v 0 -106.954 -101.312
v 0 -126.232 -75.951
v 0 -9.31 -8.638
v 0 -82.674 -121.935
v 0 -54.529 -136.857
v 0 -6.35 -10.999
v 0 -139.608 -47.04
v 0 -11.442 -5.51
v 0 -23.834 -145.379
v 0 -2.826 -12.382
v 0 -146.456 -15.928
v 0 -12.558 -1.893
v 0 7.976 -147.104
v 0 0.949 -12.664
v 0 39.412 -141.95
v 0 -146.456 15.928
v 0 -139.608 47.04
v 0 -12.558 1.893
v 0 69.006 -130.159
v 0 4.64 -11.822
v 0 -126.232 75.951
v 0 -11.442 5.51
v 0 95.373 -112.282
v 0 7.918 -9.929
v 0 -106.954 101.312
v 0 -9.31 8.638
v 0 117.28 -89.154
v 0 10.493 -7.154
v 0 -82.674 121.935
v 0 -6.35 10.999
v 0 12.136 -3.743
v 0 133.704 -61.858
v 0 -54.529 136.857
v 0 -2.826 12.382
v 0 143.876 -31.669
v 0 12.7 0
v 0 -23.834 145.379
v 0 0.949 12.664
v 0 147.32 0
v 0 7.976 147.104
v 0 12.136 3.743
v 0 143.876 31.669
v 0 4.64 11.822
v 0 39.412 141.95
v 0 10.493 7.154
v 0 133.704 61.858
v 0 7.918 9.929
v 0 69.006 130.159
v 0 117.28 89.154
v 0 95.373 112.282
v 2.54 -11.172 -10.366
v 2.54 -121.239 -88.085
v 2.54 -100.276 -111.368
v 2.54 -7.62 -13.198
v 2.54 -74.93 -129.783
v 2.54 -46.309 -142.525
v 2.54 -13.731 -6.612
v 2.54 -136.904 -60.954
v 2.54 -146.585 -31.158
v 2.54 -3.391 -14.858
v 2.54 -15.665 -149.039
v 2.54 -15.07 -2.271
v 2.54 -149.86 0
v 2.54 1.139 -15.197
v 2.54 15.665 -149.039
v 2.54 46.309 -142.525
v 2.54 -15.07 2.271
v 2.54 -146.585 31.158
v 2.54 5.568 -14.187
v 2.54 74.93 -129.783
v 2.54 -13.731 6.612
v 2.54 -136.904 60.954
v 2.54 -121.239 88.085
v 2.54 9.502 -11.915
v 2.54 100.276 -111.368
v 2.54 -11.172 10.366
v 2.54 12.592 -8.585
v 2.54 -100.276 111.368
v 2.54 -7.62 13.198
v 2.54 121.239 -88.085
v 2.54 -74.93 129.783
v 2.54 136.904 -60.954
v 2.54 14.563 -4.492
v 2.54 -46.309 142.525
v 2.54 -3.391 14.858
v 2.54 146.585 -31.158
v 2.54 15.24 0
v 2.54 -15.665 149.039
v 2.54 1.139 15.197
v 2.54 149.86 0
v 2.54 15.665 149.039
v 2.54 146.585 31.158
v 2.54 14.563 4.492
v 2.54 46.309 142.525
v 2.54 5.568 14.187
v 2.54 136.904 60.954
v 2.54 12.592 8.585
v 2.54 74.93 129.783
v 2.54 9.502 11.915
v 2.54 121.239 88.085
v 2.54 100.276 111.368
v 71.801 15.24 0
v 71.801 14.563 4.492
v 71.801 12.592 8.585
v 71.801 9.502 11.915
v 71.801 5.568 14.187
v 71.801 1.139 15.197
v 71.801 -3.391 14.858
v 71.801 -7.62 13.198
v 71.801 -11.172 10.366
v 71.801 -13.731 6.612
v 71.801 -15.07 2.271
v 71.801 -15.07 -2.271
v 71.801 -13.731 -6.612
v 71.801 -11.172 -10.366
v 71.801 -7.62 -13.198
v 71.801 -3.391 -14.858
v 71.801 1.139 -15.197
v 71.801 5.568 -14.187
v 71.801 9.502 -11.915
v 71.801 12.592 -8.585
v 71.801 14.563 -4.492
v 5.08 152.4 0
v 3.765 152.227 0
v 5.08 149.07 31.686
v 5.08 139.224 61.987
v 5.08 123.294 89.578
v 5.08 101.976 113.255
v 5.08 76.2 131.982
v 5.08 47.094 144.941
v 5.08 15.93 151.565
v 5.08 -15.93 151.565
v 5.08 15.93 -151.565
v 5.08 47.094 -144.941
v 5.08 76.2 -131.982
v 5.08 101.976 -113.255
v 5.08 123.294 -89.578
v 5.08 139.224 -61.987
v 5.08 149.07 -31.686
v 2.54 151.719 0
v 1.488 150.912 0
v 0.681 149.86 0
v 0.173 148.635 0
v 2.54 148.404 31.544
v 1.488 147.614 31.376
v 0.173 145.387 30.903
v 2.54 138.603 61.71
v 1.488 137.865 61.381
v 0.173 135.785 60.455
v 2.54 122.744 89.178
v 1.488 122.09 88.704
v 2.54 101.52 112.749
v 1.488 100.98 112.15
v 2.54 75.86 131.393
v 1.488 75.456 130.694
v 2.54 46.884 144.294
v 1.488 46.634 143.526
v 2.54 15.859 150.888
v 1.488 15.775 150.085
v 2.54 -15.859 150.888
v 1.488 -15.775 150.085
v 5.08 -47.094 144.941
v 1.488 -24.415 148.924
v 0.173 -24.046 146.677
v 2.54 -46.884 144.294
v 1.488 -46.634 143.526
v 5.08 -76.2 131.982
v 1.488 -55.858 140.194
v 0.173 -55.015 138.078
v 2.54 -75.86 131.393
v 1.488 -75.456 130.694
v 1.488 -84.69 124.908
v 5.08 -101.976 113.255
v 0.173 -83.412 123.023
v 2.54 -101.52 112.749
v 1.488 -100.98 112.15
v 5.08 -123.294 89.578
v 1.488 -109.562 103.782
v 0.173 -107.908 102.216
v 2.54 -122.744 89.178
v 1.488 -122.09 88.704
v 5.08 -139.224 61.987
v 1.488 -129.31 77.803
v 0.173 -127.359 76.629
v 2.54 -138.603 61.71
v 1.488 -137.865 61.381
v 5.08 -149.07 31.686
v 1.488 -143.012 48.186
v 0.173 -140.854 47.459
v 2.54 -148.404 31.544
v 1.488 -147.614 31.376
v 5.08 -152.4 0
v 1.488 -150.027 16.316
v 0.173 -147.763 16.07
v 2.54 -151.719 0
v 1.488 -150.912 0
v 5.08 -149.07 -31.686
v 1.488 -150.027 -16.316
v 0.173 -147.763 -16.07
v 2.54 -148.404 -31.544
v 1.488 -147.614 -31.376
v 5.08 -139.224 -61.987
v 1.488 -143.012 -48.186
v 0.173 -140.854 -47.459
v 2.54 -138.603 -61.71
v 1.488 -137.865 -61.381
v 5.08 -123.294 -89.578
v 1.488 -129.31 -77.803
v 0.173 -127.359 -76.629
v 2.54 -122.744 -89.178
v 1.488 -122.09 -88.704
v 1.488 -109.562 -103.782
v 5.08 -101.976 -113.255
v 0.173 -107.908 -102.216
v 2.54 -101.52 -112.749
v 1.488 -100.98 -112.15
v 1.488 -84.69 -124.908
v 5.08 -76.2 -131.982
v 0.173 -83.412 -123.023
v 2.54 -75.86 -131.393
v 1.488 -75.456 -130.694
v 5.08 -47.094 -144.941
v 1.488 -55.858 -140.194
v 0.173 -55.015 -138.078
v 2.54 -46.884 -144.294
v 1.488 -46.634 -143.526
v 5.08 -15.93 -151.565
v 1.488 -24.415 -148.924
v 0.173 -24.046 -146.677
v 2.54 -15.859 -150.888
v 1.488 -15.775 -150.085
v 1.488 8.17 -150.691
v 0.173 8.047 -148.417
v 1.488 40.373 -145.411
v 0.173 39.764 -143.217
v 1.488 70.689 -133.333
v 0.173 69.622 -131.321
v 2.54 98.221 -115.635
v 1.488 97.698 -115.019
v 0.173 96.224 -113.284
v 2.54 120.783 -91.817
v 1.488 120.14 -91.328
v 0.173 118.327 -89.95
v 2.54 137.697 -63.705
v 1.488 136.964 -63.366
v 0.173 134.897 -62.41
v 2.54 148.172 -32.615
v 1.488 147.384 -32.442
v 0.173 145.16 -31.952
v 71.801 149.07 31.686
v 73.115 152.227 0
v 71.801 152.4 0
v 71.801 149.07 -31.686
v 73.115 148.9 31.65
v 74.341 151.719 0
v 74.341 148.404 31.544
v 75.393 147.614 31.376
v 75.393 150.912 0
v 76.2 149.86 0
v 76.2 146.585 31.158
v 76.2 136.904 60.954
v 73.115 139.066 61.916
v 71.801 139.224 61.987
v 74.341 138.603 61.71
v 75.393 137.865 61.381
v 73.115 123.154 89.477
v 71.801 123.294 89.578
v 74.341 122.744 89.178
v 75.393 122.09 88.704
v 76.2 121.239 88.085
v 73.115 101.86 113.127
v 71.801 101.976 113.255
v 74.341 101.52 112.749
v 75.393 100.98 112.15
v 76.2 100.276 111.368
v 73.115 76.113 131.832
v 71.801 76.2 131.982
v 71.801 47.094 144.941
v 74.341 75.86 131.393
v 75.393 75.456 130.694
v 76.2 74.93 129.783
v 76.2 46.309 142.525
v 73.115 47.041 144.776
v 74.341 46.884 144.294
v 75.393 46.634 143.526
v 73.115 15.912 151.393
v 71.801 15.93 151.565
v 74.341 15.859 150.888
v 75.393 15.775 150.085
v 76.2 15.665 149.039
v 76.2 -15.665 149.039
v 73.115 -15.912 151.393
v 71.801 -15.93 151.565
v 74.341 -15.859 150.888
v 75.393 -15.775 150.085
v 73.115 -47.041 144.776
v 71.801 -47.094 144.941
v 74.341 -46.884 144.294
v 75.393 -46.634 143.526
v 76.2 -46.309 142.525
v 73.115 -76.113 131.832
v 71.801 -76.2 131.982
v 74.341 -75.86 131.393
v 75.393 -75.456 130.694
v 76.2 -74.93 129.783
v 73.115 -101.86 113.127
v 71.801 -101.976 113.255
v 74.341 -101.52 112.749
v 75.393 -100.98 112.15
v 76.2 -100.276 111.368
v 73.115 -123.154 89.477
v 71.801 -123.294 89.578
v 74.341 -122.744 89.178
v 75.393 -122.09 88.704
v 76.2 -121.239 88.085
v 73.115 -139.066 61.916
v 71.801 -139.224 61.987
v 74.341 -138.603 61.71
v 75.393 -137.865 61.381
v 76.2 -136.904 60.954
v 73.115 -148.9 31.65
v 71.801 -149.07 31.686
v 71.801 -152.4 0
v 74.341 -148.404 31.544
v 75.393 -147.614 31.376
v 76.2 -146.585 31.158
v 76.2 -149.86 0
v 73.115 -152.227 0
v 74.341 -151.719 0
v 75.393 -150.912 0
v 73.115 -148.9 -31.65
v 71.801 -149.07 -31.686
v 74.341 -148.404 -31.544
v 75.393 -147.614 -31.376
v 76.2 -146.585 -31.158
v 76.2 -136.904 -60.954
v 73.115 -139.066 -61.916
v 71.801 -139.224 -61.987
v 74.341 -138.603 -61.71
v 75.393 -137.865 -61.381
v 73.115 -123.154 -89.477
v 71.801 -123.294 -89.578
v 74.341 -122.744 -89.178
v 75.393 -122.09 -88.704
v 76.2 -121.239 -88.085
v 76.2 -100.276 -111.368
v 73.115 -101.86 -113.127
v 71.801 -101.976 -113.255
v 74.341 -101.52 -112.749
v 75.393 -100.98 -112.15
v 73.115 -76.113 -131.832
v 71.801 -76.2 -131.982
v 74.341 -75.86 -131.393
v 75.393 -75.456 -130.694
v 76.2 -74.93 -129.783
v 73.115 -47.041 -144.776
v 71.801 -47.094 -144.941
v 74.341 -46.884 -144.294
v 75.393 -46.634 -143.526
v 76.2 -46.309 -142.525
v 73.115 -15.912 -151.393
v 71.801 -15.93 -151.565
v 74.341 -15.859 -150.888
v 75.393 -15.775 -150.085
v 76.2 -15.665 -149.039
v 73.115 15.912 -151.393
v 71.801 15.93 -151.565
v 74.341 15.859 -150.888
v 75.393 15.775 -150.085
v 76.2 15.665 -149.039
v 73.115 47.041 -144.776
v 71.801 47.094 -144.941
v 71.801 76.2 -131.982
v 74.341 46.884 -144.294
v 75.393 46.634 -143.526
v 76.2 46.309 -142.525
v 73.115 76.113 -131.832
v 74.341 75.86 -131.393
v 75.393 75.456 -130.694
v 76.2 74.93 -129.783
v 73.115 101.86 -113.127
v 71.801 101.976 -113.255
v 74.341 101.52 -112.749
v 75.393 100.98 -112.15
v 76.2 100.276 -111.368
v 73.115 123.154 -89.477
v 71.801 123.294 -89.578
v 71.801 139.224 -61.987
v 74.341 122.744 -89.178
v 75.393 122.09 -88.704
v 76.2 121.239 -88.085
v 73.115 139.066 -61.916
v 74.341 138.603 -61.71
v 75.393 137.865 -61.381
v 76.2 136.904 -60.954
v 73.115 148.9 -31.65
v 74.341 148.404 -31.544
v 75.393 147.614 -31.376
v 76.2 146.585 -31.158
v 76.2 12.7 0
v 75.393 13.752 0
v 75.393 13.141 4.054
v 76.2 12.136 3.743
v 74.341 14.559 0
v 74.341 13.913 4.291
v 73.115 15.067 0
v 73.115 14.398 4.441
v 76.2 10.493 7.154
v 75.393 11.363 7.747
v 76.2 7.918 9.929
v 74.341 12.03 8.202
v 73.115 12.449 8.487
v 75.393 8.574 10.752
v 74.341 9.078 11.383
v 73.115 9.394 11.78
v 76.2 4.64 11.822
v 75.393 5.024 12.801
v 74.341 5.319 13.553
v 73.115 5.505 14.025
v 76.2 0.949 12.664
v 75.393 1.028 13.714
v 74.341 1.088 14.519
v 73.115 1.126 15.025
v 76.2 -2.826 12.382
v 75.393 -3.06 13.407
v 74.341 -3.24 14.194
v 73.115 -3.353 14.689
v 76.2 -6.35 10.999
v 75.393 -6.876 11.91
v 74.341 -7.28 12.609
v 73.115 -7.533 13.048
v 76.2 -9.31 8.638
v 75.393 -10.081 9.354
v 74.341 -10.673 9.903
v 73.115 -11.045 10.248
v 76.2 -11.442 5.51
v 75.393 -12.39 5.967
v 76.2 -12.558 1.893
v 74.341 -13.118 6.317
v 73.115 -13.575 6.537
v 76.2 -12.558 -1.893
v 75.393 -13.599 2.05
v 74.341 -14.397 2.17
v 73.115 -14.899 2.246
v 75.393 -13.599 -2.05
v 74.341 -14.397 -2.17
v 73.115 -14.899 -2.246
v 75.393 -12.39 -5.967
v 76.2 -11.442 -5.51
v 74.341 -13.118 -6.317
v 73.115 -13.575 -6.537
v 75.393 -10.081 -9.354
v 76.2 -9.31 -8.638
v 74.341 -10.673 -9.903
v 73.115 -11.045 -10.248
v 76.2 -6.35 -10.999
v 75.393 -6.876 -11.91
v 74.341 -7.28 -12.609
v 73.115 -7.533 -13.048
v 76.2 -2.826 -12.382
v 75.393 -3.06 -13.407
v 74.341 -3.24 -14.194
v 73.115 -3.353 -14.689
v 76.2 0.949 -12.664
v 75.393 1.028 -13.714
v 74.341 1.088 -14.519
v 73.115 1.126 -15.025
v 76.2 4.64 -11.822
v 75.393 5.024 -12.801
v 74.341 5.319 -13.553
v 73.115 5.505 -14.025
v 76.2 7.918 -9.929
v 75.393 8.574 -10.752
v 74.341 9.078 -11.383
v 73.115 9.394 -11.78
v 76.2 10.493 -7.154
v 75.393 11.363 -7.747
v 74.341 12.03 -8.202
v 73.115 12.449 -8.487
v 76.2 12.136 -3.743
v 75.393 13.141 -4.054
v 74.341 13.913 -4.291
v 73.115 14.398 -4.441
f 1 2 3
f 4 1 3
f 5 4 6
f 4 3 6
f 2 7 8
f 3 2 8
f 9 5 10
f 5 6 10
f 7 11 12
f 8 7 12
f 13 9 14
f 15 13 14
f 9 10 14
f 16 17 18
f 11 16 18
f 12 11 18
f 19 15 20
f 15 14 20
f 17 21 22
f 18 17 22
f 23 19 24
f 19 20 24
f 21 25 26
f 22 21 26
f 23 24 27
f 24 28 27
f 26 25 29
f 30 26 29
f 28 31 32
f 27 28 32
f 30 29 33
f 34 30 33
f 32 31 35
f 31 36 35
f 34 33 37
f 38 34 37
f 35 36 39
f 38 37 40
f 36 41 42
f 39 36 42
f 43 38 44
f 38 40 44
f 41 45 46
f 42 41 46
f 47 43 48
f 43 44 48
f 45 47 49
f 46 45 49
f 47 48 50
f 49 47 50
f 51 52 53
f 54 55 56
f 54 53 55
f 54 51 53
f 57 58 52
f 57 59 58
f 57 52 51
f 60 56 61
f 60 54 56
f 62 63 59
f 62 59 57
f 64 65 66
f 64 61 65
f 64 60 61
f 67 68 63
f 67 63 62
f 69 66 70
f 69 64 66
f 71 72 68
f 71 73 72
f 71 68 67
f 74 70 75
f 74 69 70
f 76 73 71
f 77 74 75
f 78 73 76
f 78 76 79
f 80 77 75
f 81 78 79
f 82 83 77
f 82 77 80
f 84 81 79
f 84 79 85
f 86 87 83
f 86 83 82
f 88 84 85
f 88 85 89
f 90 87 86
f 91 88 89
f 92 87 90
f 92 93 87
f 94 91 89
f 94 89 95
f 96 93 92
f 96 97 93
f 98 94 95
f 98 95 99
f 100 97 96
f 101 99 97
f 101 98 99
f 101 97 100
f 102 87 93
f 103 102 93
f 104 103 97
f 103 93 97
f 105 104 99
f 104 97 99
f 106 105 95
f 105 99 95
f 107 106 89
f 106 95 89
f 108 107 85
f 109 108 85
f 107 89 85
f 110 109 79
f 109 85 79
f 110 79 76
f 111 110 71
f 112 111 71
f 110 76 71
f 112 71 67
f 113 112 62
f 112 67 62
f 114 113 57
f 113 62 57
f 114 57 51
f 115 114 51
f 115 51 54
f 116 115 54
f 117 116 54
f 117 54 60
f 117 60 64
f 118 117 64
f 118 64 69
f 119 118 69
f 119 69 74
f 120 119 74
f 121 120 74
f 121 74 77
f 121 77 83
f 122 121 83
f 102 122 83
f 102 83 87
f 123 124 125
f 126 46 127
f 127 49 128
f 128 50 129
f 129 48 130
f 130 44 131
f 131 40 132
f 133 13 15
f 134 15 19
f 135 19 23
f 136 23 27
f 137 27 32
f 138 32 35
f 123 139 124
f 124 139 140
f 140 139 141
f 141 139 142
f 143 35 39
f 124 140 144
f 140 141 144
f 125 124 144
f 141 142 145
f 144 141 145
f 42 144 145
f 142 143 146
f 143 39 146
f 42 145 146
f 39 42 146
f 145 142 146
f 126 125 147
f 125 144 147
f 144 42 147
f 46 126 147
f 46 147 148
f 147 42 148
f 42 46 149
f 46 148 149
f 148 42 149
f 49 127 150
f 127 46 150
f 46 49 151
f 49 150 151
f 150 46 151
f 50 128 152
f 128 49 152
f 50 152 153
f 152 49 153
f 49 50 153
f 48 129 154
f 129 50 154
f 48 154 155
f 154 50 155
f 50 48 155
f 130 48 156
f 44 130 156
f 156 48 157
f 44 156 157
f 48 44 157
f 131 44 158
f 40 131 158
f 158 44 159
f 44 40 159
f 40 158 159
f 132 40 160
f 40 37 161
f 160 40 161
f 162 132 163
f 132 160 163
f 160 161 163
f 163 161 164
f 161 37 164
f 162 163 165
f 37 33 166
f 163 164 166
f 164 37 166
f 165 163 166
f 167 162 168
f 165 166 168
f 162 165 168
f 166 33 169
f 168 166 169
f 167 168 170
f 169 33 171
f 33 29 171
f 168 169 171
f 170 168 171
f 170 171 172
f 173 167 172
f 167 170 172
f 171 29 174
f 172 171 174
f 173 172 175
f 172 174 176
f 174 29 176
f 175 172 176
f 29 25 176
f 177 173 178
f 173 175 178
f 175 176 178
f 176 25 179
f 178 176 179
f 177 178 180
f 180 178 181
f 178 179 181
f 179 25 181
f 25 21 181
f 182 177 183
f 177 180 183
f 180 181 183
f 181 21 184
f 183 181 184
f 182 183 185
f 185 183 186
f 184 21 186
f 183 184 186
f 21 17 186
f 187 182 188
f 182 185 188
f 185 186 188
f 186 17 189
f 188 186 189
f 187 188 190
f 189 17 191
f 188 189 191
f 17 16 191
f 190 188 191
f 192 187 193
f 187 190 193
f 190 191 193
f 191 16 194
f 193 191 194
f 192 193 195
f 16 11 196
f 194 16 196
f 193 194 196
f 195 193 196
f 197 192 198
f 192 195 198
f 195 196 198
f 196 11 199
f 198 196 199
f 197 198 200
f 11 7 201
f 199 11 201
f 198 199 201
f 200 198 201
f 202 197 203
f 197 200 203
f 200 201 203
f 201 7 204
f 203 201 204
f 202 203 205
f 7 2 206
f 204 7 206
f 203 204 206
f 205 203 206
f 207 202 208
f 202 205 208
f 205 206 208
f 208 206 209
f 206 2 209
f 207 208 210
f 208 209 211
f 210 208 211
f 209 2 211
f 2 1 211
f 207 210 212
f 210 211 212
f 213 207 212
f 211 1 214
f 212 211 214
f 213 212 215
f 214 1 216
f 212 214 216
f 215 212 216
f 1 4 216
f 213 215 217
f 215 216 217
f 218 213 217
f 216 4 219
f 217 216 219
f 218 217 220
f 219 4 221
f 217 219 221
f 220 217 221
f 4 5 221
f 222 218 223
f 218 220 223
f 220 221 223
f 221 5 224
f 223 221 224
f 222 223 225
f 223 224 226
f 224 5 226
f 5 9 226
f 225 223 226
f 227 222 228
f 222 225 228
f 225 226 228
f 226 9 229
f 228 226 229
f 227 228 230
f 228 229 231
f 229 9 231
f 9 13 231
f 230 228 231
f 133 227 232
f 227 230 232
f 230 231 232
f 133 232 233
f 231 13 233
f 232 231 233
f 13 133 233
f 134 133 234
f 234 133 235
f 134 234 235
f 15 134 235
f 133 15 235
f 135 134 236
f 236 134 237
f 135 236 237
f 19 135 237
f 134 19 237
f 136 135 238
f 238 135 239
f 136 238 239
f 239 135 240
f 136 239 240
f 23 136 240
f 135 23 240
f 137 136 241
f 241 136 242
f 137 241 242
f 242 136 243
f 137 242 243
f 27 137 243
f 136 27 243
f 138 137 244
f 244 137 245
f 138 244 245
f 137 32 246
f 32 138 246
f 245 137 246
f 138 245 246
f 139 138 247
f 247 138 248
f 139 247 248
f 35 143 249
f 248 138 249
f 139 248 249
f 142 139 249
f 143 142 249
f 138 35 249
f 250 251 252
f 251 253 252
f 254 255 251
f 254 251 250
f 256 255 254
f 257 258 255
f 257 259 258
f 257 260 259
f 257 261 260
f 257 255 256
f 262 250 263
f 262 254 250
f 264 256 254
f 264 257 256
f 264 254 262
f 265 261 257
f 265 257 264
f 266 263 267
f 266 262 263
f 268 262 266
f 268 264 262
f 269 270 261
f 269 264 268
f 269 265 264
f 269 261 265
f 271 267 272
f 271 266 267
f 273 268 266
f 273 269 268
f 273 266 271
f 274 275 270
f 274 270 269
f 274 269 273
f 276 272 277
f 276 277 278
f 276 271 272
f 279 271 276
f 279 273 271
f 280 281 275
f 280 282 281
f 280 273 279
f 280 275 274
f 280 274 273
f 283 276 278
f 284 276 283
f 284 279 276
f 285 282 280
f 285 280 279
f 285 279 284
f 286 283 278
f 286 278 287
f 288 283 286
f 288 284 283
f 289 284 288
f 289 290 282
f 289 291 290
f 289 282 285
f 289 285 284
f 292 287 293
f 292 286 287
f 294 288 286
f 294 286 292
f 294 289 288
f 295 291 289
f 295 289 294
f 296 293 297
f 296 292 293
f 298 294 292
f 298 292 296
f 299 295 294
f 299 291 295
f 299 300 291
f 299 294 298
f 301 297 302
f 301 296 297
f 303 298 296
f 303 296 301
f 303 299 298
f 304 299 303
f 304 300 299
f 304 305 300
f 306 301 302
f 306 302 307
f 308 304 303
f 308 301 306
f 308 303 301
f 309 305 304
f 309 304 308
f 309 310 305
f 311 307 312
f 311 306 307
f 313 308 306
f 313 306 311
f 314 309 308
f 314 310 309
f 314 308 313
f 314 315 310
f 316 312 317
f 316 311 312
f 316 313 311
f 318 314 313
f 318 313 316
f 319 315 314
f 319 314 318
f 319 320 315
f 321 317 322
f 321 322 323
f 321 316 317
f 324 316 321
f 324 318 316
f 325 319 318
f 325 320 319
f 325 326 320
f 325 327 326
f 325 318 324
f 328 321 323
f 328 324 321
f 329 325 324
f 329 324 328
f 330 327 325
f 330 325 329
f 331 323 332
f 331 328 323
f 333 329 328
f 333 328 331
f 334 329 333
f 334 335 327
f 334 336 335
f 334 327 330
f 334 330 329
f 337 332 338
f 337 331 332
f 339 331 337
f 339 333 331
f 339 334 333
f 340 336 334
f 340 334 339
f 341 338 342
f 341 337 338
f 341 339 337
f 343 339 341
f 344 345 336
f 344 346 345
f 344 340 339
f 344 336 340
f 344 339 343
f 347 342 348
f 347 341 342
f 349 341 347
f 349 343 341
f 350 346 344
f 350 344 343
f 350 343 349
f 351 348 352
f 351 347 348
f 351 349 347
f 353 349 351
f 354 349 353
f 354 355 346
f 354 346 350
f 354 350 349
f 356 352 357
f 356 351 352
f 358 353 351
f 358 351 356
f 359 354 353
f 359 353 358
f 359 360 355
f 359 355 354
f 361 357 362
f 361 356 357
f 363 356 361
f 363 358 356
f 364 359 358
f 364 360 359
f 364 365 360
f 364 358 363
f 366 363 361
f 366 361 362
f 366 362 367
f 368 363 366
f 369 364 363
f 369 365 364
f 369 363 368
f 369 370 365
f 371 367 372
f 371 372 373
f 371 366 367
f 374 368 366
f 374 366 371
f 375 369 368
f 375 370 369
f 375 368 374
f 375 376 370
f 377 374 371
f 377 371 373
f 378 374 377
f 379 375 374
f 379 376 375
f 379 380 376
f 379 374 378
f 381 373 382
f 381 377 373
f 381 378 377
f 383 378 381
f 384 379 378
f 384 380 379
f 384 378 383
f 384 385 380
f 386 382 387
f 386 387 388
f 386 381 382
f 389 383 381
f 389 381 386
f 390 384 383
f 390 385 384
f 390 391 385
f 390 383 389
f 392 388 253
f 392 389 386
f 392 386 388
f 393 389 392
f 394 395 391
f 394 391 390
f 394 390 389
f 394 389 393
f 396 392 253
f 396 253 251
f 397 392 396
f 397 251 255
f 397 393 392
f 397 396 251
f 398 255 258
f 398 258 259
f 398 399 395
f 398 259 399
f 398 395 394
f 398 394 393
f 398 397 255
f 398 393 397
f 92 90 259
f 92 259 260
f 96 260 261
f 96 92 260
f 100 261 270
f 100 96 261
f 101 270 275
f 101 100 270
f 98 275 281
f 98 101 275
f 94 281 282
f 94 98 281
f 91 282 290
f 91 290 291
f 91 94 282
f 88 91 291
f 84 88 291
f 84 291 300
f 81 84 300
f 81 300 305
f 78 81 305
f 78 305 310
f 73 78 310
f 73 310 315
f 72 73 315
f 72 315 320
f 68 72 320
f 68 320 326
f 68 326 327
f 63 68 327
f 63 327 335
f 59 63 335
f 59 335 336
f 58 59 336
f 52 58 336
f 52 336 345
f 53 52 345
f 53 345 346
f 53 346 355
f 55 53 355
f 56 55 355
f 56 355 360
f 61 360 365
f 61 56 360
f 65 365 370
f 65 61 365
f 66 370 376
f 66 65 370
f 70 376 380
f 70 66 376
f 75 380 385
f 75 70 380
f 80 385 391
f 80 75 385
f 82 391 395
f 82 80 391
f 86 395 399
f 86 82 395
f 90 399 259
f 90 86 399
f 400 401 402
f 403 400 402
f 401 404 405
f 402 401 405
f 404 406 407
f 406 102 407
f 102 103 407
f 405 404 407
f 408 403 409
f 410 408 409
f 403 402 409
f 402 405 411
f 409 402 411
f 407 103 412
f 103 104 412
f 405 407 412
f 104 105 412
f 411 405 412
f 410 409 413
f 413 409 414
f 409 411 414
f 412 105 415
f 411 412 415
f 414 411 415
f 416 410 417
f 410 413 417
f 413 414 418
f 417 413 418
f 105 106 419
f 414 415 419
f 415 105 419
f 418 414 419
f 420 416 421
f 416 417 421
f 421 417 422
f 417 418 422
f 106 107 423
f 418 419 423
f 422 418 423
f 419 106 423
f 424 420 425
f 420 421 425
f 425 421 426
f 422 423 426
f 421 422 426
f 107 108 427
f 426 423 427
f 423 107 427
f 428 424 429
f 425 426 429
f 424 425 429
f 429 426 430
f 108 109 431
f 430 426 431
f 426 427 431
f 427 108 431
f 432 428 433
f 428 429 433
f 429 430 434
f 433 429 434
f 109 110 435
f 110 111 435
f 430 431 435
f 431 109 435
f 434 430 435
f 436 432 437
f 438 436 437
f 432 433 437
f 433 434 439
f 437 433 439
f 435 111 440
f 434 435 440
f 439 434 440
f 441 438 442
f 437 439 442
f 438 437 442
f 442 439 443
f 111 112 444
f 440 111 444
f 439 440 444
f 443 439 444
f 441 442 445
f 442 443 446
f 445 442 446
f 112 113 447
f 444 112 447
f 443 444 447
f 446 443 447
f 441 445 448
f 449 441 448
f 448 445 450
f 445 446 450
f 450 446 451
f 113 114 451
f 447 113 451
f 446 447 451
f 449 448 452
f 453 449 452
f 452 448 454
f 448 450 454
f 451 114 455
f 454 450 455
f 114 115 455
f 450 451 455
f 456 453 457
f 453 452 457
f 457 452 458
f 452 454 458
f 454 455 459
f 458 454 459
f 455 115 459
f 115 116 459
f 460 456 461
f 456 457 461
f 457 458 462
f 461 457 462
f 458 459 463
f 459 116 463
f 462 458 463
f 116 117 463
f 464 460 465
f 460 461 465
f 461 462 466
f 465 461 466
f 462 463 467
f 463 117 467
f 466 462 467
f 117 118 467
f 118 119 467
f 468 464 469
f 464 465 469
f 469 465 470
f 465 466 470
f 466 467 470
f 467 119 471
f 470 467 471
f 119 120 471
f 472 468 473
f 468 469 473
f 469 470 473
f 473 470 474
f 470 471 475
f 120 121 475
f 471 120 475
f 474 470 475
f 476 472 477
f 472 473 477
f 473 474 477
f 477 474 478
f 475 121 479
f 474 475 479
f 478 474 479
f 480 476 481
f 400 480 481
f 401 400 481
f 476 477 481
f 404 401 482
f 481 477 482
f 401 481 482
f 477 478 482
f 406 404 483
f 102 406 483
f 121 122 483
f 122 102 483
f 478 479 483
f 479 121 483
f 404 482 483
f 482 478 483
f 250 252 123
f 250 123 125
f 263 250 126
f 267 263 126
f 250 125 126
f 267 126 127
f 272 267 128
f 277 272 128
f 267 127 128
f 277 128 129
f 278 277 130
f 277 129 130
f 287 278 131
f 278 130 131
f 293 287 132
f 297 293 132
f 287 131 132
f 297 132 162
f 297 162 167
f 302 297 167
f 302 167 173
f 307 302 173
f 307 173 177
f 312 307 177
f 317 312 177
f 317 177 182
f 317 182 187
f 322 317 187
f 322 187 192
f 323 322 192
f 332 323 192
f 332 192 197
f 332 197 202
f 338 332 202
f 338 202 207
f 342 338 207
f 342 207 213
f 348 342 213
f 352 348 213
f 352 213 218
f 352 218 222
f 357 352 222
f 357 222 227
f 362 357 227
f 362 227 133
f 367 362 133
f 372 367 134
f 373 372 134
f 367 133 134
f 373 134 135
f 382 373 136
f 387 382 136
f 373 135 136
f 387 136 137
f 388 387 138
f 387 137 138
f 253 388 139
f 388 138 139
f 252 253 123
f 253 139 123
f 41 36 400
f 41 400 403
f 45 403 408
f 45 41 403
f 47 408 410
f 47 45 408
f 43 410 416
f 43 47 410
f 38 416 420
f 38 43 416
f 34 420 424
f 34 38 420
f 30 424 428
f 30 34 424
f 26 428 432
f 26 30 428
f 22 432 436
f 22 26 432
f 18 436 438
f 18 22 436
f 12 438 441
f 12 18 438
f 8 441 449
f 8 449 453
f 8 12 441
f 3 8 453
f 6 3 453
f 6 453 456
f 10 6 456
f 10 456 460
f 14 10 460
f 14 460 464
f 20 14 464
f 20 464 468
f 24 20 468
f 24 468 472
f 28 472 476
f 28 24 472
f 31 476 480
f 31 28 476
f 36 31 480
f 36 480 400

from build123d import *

# Parameters (mm, degrees)
F0_R     = 152.4
F0_R_2   = 12.7
F1_DEPTH = 76.2
F2_T     = -2.54
F4_R     = 5.08


# Not quite as in the source:
# - a fillet or chamfer that OpenCascade refuses, or shapes differently, is made with other operations: its cross-section is extruded or revolved along the edge and cut away or added


with BuildPart() as f1:
    # F0 (on Right) → F1 (new body)
    with BuildSketch(Plane.YZ):
        Circle(F0_R)
        Circle(F0_R_2, mode=Mode.SUBTRACT)
    extrude(amount=F1_DEPTH)

    # F2
    f2_openings = [f1.faces().sort_by_distance(p)[0] for p in [
        (76.2, -148.089477, 0),
    ]]
    offset(amount=F2_T, openings=f2_openings)

    # F3: fillet of radius 5.08 on 2 edges, made by hand

    # F3_s1 → F3_t2 (revolve, cut)
    with BuildSketch(Plane.XY):
        with BuildLine():
            ThreePointArc((71.8005909488, 152.4), (74.3405909488, 151.7194090512), (76.2, 149.86))
            Line((76.2, 149.86), (76.2, 152.4))
            Line((76.2, 152.4), (71.8005909488, 152.4))
        make_face()
    revolve(axis=Axis((76.2, 0, 0), (1, 0, 0)), mode=Mode.SUBTRACT)

    # F3_s3 → F3_t4 (revolve, cut)
    with BuildSketch(Plane.XY):
        with BuildLine():
            ThreePointArc((76.2, 12.7), (74.3405909488, 14.5594090512), (71.8005909488, 15.24))
            Line((71.8005909488, 15.24), (76.2, 15.24))
            Line((76.2, 15.24), (76.2, 12.7))
        make_face()
    revolve(axis=Axis((76.2, 0, 0), (1, 0, 0)), mode=Mode.SUBTRACT)

    # F4
    f4_edges = [f1.edges().sort_by_distance(p)[0] for p in [
        (0, -152.4, 0),
        (35.900295, 152.4, 0),
        (71.800591, -152.4, 0),
    ]]
    fillet(f4_edges, radius=F4_R)


solid = f1.part
